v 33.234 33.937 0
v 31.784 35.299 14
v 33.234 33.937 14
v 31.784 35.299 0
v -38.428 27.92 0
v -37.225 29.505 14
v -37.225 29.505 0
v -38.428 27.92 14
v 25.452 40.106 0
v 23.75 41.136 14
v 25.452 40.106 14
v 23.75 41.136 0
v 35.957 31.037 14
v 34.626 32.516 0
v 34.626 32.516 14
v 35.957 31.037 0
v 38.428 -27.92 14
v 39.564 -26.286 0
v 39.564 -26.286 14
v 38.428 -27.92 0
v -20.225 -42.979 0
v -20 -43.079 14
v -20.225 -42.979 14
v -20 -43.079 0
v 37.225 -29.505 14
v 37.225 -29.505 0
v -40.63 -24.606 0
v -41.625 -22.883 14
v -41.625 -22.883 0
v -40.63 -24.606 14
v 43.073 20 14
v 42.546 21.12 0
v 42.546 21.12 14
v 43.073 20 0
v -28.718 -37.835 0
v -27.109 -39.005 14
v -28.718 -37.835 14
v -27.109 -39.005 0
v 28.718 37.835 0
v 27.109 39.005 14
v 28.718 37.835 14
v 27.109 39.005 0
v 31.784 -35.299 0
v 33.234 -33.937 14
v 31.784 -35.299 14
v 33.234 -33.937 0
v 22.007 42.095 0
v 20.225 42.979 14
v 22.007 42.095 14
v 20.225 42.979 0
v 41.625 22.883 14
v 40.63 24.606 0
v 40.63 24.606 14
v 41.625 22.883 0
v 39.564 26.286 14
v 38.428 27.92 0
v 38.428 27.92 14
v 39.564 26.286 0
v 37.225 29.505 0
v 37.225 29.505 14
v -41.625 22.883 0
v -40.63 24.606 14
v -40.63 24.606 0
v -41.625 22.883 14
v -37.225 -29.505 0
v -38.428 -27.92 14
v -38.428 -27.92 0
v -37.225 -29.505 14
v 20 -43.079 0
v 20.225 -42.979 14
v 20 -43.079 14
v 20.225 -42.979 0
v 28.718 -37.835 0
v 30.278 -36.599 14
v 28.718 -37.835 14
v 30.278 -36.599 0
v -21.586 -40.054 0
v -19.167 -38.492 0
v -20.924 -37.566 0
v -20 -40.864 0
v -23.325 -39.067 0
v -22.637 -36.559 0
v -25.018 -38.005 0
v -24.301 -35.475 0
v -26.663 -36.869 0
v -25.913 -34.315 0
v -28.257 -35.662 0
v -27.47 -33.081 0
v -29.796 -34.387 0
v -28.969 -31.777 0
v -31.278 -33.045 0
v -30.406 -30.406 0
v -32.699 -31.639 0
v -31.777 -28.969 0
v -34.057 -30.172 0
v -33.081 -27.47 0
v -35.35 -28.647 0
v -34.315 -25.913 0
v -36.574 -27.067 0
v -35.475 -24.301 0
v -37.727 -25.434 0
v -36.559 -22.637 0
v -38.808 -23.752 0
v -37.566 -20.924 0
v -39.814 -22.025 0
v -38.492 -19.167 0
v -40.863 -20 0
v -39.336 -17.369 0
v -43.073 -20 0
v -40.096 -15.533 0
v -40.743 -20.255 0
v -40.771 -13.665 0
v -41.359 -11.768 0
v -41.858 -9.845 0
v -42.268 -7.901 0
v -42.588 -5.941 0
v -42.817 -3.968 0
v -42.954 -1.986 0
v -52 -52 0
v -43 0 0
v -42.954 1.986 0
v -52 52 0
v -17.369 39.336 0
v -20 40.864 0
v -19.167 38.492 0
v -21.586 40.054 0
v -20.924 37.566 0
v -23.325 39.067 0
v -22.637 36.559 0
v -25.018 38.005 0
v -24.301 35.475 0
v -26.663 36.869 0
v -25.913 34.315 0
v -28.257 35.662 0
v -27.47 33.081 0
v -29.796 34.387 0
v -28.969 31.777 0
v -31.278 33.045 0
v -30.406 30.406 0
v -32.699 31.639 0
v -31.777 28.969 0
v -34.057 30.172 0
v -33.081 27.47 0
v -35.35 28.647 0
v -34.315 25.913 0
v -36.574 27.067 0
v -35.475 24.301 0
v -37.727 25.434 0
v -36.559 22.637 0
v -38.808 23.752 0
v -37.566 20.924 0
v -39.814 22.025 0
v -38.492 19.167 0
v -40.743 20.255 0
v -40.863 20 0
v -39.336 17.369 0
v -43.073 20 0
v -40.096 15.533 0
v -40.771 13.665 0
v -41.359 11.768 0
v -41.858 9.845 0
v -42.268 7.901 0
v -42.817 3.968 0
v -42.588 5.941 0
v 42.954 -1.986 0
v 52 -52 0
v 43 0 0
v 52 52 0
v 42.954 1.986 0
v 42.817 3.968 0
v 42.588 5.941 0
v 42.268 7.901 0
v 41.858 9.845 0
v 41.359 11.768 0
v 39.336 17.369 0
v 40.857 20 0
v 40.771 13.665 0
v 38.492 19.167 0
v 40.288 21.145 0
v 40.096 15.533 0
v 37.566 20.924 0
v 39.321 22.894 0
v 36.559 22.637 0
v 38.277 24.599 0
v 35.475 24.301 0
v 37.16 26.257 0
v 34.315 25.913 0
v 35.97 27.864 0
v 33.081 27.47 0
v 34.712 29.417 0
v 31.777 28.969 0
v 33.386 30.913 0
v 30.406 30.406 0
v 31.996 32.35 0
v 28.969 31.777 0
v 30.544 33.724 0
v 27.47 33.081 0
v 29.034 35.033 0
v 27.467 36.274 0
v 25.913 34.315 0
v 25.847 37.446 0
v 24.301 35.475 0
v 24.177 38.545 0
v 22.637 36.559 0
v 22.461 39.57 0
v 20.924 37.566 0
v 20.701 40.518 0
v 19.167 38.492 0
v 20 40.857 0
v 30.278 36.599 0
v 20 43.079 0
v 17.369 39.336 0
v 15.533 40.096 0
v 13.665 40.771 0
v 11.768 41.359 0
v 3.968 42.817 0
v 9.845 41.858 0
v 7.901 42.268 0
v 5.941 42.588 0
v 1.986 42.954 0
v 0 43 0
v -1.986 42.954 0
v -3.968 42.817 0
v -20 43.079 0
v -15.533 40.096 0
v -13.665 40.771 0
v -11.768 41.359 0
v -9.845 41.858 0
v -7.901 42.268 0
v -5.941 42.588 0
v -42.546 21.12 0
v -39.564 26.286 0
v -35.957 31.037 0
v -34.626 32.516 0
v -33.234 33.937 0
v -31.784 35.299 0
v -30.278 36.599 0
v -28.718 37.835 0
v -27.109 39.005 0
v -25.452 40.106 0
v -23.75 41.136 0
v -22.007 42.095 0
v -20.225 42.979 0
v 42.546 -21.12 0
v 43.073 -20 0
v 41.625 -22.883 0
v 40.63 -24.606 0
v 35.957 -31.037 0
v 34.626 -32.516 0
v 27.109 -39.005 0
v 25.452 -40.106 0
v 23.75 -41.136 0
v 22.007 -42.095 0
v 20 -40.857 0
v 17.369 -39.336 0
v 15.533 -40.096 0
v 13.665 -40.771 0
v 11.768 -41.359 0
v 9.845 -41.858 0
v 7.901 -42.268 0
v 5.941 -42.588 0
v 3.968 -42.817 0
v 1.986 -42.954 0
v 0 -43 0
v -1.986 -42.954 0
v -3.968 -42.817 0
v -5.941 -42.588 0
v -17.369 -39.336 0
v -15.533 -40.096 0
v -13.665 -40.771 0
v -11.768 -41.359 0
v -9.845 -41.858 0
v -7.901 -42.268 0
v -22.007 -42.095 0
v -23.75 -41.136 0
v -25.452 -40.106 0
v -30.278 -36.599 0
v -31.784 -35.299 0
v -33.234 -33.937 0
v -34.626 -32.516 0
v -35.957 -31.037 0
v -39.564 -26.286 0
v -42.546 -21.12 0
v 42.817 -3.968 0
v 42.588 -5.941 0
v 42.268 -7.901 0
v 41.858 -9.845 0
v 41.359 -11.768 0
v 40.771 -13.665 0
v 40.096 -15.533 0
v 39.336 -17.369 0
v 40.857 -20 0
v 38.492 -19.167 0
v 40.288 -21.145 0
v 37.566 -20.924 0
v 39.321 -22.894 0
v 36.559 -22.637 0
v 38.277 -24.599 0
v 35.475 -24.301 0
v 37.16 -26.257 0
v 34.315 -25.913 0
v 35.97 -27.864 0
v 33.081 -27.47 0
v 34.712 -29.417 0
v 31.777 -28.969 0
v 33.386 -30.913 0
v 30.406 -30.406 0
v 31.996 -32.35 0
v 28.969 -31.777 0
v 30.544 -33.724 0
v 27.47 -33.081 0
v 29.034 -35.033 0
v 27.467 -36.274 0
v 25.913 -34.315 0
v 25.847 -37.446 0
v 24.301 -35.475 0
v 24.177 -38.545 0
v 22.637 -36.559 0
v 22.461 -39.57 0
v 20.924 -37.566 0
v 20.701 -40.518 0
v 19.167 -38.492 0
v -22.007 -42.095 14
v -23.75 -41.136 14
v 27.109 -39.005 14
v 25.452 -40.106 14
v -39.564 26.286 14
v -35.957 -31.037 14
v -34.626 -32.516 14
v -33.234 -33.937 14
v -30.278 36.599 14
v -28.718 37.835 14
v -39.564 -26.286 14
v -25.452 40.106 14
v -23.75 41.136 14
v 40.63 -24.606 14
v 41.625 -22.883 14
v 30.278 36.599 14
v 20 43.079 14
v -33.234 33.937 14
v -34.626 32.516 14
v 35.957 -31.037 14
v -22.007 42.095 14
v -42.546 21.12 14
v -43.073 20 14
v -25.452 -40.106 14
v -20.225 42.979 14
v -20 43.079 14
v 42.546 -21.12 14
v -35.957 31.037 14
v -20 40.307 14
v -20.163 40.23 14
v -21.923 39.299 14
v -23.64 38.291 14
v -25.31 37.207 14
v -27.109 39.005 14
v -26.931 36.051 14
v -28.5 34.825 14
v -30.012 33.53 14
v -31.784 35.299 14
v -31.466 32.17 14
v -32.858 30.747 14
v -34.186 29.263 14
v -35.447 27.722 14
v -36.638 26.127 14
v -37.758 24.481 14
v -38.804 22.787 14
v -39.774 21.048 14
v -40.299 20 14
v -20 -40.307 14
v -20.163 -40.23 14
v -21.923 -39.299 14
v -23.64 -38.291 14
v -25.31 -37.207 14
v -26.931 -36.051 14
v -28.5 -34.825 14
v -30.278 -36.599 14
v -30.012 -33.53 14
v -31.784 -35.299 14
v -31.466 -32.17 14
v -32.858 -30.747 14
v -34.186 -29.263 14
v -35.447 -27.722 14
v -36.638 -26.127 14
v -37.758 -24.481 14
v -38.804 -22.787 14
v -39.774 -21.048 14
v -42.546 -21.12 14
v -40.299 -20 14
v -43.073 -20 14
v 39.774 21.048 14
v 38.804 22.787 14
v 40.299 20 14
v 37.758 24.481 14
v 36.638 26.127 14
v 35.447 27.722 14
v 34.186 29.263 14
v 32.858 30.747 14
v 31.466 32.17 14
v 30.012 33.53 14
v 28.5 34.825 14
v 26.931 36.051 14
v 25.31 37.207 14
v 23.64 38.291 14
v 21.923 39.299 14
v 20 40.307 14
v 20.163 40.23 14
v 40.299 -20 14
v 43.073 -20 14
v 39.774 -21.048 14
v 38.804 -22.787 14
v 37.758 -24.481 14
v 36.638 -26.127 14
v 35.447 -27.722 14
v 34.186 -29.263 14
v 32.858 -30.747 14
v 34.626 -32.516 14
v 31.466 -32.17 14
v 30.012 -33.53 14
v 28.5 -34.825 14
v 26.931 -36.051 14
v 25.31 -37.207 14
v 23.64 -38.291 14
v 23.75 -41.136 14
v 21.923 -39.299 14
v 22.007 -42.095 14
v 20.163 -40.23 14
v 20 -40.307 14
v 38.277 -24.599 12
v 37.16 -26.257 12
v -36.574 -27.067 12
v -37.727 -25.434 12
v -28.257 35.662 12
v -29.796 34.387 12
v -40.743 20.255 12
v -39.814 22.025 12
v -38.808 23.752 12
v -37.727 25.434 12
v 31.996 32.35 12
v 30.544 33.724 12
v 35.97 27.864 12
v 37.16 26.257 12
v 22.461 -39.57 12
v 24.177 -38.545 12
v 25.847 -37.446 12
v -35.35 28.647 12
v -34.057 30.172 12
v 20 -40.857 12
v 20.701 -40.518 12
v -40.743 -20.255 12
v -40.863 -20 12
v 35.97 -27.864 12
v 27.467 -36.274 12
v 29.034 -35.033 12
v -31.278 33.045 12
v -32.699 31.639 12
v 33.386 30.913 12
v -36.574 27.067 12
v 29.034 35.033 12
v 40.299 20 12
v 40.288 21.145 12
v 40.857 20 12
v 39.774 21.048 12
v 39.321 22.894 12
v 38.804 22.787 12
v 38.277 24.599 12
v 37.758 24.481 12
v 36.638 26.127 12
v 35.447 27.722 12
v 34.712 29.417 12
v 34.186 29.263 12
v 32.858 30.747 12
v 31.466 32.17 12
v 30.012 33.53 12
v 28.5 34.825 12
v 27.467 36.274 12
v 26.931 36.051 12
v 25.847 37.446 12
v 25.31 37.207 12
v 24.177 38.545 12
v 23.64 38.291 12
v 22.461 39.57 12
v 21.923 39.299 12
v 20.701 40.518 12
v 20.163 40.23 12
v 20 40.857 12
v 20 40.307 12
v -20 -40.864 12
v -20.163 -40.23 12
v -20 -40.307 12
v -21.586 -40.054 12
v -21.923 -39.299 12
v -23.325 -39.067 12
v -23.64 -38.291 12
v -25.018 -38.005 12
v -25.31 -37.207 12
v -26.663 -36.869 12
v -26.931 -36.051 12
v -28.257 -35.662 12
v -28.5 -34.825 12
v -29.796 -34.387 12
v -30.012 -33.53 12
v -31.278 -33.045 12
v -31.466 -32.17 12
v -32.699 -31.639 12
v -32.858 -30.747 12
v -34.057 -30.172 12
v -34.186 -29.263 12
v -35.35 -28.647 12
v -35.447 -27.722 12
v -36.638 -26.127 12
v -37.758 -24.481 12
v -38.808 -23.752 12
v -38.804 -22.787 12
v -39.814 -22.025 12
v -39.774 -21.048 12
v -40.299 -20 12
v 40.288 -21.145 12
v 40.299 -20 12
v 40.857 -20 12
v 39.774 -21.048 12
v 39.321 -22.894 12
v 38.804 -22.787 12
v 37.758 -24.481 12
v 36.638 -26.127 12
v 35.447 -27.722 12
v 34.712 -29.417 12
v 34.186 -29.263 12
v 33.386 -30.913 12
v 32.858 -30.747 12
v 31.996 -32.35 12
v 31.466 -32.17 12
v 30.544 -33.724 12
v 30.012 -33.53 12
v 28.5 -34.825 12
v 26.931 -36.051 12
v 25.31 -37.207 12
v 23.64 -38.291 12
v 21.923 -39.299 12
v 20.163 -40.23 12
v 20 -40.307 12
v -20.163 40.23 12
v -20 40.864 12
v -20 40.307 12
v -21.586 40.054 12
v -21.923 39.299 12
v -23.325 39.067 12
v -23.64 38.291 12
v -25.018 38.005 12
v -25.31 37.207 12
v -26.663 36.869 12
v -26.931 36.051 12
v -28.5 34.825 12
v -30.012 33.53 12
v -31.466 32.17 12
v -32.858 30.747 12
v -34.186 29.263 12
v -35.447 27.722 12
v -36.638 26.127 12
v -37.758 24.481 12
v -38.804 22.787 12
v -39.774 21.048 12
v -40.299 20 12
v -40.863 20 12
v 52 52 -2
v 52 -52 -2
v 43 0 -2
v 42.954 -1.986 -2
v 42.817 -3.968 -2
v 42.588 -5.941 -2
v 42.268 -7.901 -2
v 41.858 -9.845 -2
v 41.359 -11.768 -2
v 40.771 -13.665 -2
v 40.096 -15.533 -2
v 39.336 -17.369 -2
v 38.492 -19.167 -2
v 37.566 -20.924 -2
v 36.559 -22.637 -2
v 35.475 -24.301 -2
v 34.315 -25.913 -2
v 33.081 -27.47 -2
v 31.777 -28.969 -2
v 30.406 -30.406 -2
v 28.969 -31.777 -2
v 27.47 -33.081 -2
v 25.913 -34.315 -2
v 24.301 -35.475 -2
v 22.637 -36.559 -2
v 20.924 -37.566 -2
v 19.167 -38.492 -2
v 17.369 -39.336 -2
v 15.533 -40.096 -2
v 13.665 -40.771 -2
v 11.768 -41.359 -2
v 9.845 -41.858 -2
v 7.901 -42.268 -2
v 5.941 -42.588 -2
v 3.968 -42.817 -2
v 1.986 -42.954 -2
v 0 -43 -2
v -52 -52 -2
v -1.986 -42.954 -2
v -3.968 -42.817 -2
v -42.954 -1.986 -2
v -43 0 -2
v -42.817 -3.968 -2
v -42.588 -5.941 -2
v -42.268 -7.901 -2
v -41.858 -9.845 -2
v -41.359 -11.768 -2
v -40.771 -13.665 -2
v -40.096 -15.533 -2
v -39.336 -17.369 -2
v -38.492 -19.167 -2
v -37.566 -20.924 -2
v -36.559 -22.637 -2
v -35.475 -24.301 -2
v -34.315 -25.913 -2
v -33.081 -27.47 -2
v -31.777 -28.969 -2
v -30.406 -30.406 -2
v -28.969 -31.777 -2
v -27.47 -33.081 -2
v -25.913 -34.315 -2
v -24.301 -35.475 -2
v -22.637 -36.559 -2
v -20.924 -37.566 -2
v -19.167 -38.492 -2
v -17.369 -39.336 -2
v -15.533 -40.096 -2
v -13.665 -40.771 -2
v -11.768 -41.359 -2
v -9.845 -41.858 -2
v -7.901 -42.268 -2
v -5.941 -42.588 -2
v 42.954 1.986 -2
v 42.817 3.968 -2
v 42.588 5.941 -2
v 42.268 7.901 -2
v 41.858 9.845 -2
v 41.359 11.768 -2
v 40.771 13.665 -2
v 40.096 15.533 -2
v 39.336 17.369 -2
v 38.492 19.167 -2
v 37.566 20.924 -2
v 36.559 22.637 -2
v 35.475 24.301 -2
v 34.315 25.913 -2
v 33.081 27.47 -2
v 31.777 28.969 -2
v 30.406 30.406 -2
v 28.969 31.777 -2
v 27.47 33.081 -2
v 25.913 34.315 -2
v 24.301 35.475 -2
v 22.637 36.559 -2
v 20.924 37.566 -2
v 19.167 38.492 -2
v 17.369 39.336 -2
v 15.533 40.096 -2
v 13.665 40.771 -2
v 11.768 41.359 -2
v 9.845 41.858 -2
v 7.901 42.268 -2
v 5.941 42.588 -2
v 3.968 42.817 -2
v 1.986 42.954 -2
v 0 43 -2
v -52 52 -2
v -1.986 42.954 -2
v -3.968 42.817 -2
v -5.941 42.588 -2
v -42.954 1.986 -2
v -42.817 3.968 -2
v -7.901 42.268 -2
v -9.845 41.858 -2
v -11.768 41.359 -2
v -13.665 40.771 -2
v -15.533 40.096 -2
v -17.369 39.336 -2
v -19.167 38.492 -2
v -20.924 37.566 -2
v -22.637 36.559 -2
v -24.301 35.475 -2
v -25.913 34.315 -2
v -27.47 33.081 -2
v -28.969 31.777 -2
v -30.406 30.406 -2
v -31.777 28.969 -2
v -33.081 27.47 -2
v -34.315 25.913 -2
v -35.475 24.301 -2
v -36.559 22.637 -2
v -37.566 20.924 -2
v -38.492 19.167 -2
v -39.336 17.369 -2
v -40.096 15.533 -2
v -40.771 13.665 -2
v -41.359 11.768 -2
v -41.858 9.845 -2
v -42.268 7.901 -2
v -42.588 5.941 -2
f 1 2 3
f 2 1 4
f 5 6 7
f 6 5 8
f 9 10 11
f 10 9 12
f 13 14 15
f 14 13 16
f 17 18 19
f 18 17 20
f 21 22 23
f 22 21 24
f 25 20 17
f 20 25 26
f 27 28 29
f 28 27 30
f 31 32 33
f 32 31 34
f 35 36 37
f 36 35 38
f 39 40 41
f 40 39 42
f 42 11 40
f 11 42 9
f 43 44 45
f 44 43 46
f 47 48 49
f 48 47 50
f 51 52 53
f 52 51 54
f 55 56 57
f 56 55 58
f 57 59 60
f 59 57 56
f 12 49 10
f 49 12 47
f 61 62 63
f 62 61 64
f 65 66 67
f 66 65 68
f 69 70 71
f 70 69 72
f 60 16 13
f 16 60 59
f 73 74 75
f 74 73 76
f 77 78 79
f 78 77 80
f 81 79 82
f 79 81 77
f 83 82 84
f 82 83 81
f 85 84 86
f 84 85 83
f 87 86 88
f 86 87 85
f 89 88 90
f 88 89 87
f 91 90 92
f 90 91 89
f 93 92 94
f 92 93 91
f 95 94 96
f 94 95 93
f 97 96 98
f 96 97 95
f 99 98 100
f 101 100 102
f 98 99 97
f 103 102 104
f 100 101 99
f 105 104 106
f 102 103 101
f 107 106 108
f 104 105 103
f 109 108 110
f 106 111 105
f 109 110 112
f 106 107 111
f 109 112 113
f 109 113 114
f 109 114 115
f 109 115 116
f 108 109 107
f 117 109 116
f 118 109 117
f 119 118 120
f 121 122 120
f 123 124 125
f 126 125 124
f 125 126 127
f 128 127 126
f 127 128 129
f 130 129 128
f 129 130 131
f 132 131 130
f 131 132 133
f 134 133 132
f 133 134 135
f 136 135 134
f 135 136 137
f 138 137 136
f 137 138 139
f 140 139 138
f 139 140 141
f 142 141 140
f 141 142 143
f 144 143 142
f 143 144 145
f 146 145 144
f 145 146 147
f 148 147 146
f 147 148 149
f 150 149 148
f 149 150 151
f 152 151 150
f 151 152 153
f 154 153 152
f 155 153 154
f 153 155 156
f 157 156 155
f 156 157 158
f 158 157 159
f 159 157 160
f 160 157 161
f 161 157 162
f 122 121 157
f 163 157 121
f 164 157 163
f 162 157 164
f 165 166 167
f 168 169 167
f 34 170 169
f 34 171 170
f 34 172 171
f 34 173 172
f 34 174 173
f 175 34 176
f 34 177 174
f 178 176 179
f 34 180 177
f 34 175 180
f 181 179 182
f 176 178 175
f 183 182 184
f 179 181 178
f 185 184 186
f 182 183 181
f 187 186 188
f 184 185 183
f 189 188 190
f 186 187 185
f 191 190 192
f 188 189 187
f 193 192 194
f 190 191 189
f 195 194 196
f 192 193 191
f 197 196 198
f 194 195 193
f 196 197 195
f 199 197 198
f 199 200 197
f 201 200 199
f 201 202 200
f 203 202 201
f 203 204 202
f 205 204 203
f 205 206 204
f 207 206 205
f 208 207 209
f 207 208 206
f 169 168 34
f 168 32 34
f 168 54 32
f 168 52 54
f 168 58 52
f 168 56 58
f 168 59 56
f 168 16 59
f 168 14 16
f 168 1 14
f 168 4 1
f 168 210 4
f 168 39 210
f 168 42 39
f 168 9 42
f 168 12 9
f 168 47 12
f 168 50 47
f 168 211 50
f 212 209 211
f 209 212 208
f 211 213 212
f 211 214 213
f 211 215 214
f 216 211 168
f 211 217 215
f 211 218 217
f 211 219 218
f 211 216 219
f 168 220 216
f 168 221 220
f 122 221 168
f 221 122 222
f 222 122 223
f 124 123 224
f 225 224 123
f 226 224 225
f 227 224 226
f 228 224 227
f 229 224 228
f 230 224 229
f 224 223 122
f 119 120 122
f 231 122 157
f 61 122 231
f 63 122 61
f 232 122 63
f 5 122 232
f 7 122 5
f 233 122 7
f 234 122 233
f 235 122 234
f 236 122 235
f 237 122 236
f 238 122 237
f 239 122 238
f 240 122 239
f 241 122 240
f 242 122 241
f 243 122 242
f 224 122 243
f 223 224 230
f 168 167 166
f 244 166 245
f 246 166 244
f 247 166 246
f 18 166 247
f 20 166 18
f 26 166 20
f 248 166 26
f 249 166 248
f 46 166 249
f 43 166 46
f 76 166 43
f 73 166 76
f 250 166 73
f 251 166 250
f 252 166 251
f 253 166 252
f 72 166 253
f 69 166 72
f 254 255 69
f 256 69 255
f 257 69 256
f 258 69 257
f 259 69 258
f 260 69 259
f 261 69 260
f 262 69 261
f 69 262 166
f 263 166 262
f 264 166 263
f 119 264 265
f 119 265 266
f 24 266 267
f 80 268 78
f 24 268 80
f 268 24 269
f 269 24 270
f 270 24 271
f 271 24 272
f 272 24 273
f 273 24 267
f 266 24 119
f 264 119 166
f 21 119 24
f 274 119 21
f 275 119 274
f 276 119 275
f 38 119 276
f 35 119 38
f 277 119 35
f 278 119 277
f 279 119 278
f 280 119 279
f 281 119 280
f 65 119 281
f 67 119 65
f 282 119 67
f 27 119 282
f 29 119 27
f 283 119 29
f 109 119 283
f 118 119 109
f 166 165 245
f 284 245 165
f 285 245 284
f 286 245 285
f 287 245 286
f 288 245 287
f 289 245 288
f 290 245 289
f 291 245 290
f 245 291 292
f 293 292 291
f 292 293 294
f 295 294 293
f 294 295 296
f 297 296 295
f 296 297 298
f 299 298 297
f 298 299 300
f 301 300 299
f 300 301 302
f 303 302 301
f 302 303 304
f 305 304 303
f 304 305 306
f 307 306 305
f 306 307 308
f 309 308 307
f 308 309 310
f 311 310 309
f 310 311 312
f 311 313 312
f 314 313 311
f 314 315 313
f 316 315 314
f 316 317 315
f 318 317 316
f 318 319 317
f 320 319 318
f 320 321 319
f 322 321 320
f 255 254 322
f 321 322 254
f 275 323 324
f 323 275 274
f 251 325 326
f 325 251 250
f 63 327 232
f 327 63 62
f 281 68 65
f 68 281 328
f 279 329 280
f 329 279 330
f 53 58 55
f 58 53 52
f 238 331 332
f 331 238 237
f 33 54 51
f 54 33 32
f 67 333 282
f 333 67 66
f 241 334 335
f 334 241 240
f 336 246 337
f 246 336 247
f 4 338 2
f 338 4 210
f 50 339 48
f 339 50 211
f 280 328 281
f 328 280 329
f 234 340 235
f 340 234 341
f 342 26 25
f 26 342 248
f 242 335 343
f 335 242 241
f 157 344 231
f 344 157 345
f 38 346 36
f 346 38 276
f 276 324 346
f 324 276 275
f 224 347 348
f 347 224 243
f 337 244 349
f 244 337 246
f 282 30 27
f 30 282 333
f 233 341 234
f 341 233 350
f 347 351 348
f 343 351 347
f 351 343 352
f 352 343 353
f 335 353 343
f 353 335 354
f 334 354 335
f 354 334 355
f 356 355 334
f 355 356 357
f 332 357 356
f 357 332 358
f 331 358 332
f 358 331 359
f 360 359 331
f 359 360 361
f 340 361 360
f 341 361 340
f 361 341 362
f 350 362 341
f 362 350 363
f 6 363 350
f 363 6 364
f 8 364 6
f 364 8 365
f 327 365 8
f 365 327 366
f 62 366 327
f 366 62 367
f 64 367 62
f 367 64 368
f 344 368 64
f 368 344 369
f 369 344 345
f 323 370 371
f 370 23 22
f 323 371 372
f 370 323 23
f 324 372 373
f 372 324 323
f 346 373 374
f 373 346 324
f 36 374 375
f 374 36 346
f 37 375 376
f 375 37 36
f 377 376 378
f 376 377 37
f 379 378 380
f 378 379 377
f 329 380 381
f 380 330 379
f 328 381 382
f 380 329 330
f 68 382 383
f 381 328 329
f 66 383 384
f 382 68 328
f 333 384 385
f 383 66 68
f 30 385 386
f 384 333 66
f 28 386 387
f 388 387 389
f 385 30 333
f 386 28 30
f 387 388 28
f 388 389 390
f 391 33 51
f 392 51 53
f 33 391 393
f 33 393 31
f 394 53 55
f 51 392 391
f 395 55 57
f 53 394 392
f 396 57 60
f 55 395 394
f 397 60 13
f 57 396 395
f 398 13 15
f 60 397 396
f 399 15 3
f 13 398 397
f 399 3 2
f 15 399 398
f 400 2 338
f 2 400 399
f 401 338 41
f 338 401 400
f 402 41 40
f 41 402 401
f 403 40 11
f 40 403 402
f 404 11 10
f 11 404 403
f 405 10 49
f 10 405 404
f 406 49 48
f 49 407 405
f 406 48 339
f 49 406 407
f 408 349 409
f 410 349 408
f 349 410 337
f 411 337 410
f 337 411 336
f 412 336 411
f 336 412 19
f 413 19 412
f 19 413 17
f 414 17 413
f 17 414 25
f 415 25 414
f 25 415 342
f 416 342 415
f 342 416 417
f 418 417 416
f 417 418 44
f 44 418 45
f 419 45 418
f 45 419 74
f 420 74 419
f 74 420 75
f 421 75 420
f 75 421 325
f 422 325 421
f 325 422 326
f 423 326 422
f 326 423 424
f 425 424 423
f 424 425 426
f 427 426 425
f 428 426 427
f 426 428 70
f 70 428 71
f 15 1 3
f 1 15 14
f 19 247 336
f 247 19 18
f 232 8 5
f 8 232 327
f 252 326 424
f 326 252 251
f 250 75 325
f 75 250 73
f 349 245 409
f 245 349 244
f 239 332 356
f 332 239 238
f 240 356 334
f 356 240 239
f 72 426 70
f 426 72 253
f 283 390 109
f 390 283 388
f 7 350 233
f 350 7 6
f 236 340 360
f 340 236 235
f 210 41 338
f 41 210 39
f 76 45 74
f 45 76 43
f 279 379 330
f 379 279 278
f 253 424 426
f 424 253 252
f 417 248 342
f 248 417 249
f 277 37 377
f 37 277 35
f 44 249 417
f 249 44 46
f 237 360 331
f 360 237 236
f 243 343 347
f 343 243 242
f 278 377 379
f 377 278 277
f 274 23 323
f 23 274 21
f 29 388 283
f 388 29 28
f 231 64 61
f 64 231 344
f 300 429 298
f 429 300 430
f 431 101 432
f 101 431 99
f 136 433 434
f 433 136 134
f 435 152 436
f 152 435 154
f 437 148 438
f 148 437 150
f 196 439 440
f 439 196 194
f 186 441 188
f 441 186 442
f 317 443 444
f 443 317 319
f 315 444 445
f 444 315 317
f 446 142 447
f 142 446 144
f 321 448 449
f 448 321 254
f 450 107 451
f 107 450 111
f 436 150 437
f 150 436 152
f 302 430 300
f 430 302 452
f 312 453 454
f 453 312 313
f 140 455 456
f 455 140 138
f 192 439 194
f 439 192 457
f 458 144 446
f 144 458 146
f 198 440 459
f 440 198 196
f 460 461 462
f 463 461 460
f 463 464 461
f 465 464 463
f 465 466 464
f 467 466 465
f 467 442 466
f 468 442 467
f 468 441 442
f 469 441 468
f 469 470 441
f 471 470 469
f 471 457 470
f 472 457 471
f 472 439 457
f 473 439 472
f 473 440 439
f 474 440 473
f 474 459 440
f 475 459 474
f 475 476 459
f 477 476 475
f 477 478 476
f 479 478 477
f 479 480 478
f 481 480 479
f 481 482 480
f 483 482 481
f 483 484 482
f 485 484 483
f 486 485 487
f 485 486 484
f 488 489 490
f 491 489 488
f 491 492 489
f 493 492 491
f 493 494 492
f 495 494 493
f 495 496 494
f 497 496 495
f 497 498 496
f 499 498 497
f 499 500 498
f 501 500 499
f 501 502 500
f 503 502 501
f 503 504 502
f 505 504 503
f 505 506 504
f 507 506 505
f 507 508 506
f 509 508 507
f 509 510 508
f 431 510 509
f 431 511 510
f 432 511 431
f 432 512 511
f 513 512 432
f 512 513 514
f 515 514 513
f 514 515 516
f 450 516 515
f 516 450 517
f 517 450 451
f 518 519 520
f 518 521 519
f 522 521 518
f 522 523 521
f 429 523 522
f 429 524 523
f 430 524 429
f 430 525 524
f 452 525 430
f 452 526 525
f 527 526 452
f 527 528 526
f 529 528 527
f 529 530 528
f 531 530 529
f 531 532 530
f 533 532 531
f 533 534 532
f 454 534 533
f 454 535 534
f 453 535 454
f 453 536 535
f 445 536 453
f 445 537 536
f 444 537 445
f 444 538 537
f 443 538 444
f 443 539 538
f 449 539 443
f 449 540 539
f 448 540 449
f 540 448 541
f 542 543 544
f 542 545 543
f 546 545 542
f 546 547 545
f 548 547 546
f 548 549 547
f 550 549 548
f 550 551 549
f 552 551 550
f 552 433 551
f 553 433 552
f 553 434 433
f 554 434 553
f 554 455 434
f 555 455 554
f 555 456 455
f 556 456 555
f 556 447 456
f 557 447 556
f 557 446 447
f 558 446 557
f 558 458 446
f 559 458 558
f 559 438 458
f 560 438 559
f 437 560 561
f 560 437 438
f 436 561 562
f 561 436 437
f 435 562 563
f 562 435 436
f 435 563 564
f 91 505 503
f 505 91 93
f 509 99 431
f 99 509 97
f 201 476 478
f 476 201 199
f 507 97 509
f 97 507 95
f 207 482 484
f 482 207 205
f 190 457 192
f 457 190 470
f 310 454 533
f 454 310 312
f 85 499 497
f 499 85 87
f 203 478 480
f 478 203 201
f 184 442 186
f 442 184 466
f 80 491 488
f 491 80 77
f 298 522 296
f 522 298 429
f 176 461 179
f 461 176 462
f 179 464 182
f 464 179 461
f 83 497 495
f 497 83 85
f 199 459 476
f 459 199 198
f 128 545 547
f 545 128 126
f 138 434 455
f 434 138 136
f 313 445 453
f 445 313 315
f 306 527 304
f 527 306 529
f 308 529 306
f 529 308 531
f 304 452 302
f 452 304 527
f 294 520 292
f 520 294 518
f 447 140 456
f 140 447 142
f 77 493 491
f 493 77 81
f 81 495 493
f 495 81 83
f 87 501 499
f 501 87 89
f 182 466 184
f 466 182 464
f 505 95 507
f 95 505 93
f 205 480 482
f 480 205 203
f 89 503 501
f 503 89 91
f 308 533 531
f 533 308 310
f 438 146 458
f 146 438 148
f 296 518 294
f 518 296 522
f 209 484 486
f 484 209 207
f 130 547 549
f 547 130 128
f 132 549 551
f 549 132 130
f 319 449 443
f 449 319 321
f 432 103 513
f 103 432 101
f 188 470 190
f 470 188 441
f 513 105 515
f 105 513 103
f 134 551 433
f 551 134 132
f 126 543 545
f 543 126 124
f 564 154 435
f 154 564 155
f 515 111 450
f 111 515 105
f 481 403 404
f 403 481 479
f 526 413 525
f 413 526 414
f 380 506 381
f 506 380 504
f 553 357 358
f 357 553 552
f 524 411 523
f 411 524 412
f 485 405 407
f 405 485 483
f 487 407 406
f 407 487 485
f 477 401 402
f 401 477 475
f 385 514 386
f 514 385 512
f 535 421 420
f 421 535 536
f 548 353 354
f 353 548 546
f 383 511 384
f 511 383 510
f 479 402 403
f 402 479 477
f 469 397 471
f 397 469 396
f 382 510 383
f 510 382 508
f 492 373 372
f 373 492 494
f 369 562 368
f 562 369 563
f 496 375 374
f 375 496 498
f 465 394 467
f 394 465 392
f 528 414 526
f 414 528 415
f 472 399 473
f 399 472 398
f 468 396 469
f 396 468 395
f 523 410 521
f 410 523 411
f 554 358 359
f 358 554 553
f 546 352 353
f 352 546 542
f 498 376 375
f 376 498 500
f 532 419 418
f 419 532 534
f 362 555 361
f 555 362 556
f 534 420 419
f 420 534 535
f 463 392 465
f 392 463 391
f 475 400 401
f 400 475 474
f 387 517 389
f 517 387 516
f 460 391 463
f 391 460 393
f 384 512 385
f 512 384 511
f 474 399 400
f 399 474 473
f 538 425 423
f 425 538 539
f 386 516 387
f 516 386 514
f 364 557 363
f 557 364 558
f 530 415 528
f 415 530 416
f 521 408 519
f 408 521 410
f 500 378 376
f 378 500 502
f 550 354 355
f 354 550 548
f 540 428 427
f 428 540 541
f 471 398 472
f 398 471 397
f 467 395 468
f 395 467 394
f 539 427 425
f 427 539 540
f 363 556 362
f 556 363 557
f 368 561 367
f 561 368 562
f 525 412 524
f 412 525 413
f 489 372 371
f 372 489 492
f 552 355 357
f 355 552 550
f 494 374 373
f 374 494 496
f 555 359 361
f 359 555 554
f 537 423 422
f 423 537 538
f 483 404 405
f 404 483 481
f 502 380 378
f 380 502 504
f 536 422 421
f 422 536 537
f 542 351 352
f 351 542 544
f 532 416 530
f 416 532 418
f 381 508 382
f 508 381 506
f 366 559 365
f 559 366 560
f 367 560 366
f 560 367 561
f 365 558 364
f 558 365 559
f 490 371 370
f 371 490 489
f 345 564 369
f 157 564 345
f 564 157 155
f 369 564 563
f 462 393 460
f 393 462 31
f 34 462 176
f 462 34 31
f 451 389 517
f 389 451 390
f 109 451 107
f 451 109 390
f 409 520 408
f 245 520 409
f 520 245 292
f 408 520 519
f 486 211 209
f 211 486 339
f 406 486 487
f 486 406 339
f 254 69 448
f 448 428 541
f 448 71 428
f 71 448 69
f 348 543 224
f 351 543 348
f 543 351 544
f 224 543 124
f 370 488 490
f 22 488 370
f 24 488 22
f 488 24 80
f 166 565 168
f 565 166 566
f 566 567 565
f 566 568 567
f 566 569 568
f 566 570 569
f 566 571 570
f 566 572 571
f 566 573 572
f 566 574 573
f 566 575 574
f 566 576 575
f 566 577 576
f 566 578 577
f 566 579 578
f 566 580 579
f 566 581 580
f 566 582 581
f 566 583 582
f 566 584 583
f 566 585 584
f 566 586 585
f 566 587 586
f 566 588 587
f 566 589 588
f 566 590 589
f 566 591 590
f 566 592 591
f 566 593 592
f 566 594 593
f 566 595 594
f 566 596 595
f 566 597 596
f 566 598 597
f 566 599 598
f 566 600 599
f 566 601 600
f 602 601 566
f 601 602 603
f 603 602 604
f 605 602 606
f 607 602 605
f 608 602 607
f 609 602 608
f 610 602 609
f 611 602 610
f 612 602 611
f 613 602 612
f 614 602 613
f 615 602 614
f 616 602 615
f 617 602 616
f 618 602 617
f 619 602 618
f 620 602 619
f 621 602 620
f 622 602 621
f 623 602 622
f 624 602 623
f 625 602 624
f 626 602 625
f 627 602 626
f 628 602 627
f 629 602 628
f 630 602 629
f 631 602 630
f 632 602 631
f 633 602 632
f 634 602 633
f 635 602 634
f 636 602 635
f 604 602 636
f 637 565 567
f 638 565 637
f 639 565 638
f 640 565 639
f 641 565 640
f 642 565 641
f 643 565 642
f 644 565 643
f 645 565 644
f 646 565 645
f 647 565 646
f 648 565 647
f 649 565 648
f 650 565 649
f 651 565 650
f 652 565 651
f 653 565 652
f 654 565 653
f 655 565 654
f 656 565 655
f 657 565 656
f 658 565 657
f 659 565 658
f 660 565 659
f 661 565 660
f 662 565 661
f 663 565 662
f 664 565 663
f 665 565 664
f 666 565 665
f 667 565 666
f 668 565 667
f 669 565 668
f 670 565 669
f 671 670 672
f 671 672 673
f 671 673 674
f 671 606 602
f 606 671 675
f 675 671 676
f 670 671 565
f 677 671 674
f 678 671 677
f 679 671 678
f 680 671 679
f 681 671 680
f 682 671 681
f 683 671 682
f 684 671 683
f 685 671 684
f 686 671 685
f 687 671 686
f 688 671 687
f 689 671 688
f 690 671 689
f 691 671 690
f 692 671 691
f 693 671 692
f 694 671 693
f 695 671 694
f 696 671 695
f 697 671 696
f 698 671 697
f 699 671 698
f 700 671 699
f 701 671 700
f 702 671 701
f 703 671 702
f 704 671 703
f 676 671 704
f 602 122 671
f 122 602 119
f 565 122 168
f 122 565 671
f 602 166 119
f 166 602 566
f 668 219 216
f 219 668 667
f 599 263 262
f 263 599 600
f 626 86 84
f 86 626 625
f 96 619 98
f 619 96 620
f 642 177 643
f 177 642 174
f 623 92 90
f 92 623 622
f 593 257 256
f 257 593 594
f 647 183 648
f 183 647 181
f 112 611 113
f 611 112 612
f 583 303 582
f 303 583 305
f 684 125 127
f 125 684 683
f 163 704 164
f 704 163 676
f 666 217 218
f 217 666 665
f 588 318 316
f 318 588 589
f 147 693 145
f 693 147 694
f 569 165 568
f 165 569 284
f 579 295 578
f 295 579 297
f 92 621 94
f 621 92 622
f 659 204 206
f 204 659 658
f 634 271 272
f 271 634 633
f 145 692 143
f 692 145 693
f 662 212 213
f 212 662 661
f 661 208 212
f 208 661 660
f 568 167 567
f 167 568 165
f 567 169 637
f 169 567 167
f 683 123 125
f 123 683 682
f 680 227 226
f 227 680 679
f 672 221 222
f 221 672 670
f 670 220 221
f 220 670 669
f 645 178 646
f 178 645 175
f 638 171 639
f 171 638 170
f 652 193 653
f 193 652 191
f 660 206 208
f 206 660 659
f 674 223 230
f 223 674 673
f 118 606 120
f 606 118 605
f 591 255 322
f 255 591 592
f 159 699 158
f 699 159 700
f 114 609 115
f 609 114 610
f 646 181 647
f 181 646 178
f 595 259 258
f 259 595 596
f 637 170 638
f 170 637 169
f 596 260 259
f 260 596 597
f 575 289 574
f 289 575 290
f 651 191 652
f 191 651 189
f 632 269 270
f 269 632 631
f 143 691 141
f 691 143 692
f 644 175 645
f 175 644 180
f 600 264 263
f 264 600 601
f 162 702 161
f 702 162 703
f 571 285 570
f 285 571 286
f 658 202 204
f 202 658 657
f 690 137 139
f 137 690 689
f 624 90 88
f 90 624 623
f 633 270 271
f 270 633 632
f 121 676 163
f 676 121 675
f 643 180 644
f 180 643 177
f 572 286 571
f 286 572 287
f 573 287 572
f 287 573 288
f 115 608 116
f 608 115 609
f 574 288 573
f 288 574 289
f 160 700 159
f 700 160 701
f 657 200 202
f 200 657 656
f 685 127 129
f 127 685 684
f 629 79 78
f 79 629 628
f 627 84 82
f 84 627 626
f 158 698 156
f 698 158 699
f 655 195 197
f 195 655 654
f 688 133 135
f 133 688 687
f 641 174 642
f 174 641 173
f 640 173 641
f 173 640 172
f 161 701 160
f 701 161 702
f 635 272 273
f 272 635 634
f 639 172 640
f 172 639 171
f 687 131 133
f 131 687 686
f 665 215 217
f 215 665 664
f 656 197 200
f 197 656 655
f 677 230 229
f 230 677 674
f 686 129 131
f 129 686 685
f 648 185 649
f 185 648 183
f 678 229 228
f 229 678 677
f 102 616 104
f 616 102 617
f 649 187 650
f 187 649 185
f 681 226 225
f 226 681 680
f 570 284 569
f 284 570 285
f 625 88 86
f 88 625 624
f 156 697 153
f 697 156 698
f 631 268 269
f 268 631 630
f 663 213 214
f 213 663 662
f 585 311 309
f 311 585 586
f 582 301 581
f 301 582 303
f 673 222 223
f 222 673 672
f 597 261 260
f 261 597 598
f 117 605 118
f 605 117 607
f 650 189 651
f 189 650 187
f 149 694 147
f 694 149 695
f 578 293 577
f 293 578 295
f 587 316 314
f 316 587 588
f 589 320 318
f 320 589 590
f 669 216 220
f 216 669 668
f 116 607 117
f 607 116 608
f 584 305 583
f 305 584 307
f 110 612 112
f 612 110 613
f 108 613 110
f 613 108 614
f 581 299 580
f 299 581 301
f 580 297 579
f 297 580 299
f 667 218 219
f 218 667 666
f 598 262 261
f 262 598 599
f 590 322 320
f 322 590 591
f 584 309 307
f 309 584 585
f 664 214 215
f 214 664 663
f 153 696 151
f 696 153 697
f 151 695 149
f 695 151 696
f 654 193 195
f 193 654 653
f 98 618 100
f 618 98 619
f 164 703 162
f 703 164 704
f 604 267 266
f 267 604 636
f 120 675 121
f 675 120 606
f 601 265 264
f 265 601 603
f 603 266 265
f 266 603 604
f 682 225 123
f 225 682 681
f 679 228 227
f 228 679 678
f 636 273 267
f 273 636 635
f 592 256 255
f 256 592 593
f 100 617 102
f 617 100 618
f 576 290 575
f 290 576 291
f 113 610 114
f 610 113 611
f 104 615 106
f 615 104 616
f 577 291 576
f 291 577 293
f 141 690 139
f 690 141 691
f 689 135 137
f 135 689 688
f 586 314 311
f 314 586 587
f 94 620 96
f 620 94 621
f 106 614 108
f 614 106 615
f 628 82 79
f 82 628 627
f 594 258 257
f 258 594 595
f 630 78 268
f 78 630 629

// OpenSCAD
$fa=0.2;
$fn=0;

difference()
{
  cylinder(r=47.5,h=14);
  cylinder(r=45.5,h=12);
  cylinder(r=45,h=14);
  translate([-50,-20,0]) cube([100,40,14]);
  translate([-20,-50,0]) cube([40,100,14]);
}
translate([0,0,-2]) 
  difference()
  {
    translate([-52,-52,0]) cube([104,104,2]);
    cylinder(r=43,h=2);
  }

/*
translate([0,0,-10])  
{
  difference()
  {
    translate([-52,-52,0]) cube([104,104,2]);
    cylinder(r=43,h=2);
  }
  translate([-54,-30,0]) 
    union()
    {
       cube([2,10,5]);
       translate([0,0,4]) cube([2.5,10,2]);
    }
  translate([-54,20,0]) 
    union()
    {
       cube([2,10,5]);
       translate([0,0,4]) cube([2.5,10,2]);
    }
  translate([52,-30,0])
    union()
    {
       cube([2,10,5]);
       translate([-0.5,0,4]) cube([2.5,10,2]);
    }
  translate([52,20,0])
    union()
    {
       cube([2,10,5]);
       translate([-0.5,0,4]) cube([2.5,10,2]);
    }
  translate([-30,-54,0])
    union()
    {
       cube([10,2,5]);
       translate([0,0,4]) cube([10,2.5,2]);
    }
  translate([20,-54,0])
    union()
    {
       cube([10,2,5]);
       translate([0,0,4]) cube([10,2.5,2]);
    }
  translate([-30,52,0])
    union()
    {
       cube([10,2,5]);
       translate([0,-0.5,4]) cube([10,2.5,2]);
    }
  translate([20,52,0])
    union()
    {
       cube([10,2,5]);
       translate([0,-0.5,4]) cube([10,2.5,2]);
    }
}
*/
